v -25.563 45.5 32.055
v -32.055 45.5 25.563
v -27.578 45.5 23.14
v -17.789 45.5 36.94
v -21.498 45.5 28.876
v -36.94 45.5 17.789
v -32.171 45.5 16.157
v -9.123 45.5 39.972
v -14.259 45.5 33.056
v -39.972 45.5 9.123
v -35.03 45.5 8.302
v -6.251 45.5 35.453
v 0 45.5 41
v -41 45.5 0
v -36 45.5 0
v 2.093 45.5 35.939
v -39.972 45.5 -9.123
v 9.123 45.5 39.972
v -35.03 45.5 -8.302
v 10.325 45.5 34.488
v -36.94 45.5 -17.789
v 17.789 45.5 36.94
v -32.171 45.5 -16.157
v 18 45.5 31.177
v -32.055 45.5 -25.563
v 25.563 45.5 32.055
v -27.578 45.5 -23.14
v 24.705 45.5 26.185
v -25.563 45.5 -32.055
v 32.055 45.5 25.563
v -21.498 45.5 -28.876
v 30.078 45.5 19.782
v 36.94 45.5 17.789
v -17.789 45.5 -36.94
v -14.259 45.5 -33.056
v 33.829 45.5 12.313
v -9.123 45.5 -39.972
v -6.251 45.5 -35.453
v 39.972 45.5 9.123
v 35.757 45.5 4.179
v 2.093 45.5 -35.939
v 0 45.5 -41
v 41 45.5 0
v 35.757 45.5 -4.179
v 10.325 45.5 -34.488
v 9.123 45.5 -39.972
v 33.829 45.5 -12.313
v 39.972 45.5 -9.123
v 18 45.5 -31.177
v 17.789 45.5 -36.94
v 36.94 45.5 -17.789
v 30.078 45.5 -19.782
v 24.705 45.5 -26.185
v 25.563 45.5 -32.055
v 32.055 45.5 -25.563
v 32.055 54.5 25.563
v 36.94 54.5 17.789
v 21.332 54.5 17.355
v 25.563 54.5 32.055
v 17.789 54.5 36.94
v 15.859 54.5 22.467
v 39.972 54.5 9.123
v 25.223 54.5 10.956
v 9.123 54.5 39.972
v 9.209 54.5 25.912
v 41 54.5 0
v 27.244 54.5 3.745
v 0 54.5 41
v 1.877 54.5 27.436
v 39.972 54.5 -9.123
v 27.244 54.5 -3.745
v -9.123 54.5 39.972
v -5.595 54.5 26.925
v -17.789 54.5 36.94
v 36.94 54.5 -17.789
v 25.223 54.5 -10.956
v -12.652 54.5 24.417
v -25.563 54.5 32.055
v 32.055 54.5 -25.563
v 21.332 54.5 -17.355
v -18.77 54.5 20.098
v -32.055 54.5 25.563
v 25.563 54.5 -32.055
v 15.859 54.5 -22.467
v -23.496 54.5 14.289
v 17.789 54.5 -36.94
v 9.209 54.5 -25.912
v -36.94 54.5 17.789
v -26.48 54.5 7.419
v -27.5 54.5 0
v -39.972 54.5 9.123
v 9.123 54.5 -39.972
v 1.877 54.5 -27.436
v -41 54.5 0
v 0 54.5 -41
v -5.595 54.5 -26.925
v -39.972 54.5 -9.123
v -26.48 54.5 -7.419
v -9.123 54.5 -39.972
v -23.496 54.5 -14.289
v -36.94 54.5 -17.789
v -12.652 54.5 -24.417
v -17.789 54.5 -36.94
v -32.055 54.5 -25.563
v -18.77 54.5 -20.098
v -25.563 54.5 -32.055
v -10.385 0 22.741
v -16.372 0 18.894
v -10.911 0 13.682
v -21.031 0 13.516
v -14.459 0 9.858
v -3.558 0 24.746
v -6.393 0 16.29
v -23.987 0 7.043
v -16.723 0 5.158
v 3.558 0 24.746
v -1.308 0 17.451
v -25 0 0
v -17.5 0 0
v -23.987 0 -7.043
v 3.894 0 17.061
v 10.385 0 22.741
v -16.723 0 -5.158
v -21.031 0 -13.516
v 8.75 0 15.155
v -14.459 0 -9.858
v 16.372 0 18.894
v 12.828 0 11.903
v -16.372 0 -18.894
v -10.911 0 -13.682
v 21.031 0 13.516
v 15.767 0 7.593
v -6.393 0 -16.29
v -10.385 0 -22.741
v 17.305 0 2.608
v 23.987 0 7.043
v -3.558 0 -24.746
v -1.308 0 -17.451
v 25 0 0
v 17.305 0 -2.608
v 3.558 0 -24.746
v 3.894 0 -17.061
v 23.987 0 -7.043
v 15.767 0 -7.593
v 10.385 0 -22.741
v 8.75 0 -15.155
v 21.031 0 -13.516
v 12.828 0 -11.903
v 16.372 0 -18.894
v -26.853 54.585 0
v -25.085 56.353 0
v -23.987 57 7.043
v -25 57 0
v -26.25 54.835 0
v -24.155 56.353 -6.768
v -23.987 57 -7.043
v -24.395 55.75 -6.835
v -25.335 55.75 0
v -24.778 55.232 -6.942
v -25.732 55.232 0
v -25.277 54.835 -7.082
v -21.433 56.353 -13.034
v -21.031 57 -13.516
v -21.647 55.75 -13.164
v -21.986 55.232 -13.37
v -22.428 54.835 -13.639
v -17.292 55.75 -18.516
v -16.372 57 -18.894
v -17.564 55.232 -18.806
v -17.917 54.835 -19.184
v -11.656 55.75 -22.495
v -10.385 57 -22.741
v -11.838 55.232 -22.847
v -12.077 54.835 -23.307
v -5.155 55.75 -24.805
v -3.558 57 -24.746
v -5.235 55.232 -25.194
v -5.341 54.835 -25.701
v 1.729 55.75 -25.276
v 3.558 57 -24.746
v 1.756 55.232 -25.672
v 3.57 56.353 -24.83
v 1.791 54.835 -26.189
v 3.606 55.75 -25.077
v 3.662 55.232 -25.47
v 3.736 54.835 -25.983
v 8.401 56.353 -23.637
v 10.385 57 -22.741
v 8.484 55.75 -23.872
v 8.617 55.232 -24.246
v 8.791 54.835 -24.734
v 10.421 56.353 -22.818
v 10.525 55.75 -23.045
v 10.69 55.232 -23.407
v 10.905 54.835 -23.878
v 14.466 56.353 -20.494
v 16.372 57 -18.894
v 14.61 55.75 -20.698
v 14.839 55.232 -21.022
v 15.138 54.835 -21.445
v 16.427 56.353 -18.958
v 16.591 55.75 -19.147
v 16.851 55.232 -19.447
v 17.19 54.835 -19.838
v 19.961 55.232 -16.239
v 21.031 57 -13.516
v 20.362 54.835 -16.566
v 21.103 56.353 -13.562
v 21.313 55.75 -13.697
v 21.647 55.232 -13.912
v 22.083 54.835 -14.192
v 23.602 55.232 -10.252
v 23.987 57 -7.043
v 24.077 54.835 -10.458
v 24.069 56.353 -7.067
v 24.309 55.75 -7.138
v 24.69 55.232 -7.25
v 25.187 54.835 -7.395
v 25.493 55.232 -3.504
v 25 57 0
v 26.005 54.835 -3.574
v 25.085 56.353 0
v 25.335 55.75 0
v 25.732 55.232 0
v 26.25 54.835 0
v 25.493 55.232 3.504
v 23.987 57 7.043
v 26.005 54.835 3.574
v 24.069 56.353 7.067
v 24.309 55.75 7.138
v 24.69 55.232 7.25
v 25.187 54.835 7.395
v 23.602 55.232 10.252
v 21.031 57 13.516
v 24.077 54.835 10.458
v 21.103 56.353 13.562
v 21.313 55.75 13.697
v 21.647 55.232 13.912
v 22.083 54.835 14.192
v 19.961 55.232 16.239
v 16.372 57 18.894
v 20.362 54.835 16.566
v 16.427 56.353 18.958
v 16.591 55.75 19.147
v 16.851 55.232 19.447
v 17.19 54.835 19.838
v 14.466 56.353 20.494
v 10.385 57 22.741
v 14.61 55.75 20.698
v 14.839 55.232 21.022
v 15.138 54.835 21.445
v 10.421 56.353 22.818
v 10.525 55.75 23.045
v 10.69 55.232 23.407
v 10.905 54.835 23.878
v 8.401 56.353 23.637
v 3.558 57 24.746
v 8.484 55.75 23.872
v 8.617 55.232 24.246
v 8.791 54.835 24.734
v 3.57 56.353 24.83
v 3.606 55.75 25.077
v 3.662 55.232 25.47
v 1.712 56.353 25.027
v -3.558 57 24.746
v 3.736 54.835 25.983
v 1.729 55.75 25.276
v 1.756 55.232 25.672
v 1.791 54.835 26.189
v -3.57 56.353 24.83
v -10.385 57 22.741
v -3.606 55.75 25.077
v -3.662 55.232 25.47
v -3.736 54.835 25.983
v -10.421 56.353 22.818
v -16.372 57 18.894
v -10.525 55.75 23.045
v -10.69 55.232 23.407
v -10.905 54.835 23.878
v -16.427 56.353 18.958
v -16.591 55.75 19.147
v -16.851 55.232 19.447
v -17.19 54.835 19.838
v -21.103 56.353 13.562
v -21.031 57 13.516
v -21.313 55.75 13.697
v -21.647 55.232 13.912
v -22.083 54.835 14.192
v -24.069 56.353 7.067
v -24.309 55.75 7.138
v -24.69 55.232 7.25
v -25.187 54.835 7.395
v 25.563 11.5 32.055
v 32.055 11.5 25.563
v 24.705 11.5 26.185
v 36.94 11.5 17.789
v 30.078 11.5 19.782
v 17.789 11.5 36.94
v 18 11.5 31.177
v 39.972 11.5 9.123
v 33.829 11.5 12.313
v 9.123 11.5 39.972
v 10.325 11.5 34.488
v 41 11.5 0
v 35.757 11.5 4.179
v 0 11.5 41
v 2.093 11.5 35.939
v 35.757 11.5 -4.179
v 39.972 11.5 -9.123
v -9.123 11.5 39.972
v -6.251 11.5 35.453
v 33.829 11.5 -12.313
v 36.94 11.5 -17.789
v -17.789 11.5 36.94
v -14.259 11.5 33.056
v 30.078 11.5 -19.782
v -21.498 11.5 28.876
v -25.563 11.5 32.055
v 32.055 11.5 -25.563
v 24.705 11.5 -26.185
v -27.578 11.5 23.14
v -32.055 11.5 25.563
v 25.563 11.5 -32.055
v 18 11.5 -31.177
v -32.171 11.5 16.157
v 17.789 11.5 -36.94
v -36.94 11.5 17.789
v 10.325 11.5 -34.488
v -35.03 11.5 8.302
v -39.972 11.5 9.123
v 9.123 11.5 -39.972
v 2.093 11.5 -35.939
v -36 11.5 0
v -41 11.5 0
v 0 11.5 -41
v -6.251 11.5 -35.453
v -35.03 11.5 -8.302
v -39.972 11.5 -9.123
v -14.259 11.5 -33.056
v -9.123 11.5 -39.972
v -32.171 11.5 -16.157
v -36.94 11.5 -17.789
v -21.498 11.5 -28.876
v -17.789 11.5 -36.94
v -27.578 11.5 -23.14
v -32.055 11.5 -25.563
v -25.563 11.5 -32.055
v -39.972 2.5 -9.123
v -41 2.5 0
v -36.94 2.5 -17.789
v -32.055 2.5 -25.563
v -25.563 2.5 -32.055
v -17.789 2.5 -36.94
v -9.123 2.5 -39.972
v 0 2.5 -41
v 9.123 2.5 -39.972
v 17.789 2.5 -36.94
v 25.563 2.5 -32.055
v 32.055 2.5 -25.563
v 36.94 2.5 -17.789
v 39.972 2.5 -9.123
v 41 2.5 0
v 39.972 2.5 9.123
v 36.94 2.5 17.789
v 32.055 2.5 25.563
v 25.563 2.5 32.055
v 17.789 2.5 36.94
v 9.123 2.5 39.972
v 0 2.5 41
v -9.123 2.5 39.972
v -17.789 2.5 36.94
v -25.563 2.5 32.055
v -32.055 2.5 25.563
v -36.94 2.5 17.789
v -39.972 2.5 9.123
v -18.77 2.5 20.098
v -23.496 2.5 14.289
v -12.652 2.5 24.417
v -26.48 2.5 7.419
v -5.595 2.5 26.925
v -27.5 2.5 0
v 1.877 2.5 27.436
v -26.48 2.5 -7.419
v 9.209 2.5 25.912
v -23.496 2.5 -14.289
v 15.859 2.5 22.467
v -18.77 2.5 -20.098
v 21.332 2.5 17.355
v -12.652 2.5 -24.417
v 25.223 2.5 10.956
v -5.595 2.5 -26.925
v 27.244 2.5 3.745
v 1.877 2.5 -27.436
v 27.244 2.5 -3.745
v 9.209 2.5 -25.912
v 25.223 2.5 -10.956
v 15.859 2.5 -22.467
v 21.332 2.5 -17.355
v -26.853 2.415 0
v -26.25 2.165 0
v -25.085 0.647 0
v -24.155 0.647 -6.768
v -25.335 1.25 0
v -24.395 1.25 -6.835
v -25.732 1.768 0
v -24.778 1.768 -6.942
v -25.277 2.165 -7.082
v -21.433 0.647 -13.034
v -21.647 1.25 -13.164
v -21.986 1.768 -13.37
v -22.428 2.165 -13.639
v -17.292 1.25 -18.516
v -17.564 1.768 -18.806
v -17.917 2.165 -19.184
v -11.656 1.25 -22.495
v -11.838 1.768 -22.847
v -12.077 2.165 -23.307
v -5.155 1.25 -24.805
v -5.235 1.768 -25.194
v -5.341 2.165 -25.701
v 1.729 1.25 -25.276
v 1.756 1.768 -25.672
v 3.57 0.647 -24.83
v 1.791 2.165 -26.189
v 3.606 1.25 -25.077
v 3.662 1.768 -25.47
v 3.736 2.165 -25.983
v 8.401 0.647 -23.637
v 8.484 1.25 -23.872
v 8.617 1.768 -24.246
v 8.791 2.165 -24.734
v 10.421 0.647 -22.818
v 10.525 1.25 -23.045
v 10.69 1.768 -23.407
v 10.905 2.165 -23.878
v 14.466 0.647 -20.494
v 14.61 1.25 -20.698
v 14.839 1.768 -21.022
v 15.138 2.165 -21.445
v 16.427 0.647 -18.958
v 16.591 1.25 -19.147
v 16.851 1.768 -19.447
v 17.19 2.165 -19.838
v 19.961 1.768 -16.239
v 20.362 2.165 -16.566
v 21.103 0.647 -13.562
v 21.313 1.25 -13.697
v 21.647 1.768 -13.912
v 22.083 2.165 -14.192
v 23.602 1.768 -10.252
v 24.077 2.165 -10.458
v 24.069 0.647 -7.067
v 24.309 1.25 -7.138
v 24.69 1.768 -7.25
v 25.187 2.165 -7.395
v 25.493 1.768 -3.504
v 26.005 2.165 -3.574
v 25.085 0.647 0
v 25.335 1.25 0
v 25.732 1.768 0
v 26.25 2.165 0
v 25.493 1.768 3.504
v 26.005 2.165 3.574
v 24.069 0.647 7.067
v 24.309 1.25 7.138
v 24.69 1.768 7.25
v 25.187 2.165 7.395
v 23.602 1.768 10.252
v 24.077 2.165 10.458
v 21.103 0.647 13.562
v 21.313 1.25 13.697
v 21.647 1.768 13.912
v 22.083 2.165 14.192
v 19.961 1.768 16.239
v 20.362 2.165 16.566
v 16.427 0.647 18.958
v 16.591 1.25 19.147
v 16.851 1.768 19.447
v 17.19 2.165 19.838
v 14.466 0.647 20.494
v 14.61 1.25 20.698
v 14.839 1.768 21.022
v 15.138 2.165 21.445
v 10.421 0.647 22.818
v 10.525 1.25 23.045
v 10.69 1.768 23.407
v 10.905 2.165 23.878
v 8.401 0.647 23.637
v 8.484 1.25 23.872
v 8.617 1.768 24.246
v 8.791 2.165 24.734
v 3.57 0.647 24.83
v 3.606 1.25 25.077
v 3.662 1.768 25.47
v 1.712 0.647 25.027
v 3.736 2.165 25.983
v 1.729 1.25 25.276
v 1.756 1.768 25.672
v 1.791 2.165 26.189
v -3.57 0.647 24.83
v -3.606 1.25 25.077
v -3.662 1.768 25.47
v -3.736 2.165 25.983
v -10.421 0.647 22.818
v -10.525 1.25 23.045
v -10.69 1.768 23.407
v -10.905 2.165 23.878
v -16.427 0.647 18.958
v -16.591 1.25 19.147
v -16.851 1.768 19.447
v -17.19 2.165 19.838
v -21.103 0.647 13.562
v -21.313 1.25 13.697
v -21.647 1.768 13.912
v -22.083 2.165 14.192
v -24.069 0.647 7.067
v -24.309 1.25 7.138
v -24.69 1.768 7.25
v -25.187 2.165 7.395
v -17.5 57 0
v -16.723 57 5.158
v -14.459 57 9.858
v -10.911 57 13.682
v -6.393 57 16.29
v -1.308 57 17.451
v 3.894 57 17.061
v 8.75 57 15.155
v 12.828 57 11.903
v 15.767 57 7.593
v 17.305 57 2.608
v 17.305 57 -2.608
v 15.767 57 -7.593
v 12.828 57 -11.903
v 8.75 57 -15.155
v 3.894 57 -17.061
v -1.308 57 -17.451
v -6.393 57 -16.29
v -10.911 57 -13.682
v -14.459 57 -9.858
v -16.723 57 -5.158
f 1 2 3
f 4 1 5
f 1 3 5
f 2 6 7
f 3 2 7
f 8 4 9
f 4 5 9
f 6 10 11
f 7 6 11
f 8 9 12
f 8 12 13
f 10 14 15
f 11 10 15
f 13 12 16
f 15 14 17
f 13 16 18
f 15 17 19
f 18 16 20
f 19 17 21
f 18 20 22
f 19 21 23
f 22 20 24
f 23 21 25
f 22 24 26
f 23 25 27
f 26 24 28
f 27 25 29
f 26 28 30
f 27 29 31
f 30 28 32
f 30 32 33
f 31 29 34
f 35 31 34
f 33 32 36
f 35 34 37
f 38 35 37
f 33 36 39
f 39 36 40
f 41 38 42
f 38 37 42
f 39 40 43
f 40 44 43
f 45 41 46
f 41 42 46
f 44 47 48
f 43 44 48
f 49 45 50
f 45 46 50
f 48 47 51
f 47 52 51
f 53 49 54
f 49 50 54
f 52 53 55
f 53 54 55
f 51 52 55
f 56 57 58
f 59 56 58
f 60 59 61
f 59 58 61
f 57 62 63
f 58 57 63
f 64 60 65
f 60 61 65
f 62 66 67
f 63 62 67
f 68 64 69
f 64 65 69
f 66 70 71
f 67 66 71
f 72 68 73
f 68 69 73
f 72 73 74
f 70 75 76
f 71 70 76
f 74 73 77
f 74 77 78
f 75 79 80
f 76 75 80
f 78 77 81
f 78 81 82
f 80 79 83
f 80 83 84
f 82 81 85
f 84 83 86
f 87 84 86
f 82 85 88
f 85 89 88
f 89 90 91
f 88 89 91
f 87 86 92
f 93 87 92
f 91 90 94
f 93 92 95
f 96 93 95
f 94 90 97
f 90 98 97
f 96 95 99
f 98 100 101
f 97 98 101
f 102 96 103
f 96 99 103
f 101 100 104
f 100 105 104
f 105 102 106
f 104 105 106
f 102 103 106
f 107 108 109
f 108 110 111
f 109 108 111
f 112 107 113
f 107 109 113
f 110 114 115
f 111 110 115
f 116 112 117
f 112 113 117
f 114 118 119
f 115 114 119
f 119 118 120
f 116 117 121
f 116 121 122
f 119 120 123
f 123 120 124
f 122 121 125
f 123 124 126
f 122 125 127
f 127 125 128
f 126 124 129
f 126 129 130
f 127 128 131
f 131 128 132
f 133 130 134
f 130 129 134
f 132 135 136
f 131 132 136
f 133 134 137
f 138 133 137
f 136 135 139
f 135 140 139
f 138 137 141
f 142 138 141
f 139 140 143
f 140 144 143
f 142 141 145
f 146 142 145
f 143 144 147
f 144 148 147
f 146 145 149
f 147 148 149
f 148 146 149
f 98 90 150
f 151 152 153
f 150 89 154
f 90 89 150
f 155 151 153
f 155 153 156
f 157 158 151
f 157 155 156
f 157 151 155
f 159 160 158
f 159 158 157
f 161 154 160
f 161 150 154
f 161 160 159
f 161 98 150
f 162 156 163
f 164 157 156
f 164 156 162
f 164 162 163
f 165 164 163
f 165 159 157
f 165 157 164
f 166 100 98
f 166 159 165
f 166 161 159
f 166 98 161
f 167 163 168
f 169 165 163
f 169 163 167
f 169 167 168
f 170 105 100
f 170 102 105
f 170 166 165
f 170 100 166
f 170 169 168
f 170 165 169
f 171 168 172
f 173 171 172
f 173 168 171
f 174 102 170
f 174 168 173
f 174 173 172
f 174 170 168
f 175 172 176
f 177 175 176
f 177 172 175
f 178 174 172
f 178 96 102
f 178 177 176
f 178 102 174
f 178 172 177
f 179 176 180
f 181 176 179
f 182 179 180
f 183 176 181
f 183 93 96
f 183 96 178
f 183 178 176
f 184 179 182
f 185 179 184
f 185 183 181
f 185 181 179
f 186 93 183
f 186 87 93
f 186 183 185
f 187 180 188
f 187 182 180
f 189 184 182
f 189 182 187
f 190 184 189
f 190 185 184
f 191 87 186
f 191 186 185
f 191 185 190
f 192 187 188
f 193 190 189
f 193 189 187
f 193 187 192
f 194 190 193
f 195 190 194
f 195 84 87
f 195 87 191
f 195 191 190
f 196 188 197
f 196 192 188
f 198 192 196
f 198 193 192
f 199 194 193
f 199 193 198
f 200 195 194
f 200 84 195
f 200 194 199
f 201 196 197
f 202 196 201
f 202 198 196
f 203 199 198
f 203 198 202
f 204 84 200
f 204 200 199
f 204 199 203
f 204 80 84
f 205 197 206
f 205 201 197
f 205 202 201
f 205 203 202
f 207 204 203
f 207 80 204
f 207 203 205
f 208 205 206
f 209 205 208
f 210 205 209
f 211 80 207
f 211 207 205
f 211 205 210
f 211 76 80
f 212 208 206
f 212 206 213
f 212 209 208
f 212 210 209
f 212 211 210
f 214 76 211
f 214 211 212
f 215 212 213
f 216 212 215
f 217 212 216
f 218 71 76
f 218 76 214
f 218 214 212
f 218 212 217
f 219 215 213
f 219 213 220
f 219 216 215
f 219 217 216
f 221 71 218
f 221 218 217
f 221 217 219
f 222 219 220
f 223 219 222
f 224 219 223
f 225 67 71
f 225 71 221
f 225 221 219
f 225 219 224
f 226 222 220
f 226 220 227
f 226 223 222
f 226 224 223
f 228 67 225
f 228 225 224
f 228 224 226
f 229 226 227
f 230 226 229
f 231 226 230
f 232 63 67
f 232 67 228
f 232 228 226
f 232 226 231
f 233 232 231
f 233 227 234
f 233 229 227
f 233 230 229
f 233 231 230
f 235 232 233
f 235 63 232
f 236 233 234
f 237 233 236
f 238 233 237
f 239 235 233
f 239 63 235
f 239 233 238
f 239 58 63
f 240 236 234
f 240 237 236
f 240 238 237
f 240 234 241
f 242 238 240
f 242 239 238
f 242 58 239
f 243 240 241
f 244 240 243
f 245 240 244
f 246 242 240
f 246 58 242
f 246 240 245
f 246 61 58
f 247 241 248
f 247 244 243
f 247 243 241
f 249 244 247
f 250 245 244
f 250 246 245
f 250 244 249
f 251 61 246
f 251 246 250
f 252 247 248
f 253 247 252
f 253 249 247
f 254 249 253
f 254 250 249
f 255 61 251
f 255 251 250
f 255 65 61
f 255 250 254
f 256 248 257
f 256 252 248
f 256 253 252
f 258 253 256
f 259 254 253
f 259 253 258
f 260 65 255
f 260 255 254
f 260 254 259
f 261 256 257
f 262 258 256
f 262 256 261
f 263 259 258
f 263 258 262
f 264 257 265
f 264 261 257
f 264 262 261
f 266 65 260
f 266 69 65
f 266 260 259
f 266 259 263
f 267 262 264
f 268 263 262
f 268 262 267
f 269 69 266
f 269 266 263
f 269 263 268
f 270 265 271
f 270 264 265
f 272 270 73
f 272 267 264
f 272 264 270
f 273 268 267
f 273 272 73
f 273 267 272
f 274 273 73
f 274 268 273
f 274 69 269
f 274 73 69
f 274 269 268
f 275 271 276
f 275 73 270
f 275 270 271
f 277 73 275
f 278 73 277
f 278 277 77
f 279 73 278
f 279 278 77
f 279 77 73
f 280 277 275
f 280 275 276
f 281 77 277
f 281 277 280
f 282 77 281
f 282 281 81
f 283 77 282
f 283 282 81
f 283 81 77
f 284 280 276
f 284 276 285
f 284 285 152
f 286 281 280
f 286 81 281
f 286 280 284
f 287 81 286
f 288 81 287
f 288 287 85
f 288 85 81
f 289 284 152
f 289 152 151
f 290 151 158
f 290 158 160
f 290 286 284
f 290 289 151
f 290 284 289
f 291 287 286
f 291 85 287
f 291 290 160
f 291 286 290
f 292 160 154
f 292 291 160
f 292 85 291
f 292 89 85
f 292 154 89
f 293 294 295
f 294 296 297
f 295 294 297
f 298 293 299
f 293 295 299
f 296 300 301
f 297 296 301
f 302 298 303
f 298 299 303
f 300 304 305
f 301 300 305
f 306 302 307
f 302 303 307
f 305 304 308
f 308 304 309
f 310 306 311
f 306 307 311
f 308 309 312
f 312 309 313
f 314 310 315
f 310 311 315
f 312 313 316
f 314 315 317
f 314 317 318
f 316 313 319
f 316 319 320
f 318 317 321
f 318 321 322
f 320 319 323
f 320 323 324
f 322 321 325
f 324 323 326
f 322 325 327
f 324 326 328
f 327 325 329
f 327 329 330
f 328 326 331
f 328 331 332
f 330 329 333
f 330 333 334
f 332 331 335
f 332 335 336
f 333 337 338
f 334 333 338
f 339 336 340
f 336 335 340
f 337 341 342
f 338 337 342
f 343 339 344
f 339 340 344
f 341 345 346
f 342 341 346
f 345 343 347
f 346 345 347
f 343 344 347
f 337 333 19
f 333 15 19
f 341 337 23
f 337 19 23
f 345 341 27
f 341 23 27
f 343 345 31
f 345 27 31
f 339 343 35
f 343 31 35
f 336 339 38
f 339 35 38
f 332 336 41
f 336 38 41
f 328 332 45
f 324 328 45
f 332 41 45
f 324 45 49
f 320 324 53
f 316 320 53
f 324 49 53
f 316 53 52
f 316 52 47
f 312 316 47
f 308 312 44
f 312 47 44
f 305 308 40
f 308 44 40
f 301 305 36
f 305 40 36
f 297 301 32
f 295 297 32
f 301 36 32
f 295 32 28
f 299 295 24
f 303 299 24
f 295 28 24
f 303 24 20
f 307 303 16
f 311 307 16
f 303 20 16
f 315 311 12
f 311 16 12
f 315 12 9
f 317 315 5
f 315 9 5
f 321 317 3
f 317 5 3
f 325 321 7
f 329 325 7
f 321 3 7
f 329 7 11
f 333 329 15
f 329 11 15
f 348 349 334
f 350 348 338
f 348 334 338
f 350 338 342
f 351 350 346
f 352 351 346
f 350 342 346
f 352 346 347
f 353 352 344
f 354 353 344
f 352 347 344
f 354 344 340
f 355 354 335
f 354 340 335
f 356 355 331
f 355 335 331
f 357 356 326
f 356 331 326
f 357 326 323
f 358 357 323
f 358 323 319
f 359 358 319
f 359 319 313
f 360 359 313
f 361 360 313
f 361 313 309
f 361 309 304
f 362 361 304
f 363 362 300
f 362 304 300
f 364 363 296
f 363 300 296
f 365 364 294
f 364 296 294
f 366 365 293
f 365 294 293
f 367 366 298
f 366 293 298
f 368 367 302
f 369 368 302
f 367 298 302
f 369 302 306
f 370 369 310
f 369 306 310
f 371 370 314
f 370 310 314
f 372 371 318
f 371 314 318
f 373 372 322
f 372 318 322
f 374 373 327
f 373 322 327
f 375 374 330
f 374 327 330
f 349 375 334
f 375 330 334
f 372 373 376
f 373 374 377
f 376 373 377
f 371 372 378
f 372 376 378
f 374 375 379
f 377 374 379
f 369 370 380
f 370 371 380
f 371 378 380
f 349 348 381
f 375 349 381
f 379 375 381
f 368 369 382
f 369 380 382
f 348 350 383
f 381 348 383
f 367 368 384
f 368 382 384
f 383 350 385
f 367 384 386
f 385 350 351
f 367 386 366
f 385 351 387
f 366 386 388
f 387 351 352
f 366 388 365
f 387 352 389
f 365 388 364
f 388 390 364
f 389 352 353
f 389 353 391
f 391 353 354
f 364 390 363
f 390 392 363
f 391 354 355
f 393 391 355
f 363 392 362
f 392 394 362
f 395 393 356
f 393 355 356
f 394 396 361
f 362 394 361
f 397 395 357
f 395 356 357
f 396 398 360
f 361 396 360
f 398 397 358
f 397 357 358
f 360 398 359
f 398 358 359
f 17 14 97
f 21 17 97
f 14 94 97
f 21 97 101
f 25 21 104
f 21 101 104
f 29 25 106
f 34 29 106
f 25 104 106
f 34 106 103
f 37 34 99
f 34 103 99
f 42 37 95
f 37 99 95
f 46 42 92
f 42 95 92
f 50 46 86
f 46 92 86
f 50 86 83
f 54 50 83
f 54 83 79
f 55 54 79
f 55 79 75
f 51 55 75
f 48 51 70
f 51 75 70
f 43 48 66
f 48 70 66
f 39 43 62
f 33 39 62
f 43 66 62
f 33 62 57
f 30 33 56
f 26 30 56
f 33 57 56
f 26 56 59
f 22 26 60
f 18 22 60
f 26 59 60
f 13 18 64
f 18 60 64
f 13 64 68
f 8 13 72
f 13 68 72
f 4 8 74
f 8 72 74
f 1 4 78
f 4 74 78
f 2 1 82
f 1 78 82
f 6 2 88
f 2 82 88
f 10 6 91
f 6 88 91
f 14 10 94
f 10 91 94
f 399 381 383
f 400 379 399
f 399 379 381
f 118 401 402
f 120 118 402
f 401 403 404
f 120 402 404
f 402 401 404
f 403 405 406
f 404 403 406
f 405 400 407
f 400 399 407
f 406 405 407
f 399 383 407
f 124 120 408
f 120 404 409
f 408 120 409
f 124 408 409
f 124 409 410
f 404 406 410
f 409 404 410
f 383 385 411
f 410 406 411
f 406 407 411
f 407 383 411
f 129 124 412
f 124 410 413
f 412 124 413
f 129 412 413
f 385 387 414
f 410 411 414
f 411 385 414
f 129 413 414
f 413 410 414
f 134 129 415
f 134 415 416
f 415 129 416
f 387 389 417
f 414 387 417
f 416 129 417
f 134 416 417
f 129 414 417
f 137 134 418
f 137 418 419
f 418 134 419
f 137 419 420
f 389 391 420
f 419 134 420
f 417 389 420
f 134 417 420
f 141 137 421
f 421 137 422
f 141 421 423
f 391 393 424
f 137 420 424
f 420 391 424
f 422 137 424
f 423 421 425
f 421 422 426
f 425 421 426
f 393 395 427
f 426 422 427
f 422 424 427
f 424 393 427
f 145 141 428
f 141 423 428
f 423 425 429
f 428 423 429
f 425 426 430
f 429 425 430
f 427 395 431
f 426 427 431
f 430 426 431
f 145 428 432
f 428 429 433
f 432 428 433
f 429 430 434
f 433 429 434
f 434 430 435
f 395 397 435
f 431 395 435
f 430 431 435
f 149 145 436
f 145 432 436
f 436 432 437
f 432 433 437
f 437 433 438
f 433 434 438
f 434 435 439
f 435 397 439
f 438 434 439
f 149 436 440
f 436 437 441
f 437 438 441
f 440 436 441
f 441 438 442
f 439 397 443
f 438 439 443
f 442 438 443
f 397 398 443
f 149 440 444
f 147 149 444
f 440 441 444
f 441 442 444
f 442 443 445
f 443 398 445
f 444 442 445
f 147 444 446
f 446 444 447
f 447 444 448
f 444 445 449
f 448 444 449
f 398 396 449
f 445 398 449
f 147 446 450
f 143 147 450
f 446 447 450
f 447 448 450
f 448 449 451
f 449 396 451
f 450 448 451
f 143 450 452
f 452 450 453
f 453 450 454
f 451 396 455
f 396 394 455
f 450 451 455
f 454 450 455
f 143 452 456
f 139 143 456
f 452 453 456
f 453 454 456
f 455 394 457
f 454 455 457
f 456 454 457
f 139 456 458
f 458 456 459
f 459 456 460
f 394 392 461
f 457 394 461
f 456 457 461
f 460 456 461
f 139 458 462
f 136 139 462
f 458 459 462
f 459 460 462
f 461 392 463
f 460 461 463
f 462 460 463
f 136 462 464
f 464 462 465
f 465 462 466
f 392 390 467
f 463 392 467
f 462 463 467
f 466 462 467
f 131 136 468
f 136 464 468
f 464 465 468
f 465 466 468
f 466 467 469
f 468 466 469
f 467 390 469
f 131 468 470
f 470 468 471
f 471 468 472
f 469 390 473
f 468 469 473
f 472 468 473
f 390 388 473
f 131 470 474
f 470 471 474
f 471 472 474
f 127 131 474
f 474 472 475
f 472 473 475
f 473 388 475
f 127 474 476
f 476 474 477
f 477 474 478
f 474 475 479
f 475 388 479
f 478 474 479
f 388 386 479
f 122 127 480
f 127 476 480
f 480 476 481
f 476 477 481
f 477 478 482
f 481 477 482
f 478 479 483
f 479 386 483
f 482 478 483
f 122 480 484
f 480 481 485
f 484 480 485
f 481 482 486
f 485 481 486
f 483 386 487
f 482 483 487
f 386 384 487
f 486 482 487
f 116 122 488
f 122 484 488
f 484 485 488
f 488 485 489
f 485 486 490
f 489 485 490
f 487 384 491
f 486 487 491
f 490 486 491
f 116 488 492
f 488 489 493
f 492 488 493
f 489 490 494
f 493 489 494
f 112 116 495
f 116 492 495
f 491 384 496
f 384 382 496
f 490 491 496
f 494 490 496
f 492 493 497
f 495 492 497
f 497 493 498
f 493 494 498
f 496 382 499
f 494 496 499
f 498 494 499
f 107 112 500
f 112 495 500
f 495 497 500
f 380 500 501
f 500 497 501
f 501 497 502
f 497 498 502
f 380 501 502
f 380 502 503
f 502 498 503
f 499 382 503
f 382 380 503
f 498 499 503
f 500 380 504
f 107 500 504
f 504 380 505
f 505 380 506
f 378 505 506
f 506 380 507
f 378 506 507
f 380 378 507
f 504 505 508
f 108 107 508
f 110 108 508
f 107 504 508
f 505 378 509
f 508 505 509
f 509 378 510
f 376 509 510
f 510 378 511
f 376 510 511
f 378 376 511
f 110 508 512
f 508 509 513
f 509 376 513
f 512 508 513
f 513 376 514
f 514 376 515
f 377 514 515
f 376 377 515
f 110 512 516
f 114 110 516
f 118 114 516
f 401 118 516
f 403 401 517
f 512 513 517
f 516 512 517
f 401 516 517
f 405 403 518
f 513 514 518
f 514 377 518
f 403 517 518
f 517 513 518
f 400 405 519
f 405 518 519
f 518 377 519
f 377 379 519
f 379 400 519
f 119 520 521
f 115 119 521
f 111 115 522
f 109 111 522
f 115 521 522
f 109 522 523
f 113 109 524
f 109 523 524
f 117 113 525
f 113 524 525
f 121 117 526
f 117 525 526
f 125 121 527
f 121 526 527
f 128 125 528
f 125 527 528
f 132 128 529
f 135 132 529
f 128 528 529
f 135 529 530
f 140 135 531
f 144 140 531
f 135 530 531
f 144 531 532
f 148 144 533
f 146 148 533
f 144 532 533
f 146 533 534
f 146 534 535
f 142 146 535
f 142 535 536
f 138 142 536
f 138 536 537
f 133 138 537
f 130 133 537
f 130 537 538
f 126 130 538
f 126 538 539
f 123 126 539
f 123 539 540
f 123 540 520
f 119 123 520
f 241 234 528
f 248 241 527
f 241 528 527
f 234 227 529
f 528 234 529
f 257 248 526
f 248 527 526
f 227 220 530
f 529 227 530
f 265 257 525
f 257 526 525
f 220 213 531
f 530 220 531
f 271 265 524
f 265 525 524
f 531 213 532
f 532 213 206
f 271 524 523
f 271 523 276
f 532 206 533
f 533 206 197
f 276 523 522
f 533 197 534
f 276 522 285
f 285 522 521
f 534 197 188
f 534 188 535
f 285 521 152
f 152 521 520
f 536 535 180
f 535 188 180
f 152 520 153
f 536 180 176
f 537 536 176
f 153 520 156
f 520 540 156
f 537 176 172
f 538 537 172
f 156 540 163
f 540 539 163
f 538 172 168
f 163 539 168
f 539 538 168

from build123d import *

# Parameters (mm, degrees)
CUT_EXTRUDE1_REACH = 83.308
SKETCH2_R          = 17.5
FILLET1_R          = 2.5


with BuildPart() as part:
    # Sketch1 → Revolve1 (revolve)
    with BuildSketch(Plane.XY, mode=Mode.PRIVATE) as revolve1_sk:
        Polygon((0, 0), (25, 0), (25, 2.5), (41, 2.5), (41, 11.5), (36, 11.5), (36, 45.5), (41, 45.5), (41, 54.5), (25, 54.5), (25, 57), (0, 57), align=None)
    revolve(revolve1_sk.sketch.rotate(Axis((0, 60.737704918, 0), (0, -1, 0)), 180), axis=Axis((0, 60.737704918, 0), (0, -1, 0)))

    # Sketch2 → Cut-Extrude1 (cut, up to next)
    with BuildSketch(Plane(origin=(0, 57, 0), x_dir=(1, 0, 0), z_dir=(0, 1, 0)), mode=Mode.PRIVATE) as cut_extrude1_sk1:
        with Locations(Location((0, 0, 0), (0, 0, 180))):
            Circle(SKETCH2_R)
    cut_extrude1_tool1 = extrude(cut_extrude1_sk1.sketch, amount=-CUT_EXTRUDE1_REACH, mode=Mode.PRIVATE) & part.part
    add(cut_extrude1_tool1.solids().sort_by_distance((0, 57, 0))[0], mode=Mode.SUBTRACT)

    # Fillet1
    fillet1_edges = [part.edges().sort_by_distance(p)[0] for p in [
        (25, 54.5, 0),
        (25, 2.5, 0),
    ]]
    fillet(fillet1_edges, radius=FILLET1_R - 0.0001)  # a hair under: the kernel refuses the full size


solid = part.part
